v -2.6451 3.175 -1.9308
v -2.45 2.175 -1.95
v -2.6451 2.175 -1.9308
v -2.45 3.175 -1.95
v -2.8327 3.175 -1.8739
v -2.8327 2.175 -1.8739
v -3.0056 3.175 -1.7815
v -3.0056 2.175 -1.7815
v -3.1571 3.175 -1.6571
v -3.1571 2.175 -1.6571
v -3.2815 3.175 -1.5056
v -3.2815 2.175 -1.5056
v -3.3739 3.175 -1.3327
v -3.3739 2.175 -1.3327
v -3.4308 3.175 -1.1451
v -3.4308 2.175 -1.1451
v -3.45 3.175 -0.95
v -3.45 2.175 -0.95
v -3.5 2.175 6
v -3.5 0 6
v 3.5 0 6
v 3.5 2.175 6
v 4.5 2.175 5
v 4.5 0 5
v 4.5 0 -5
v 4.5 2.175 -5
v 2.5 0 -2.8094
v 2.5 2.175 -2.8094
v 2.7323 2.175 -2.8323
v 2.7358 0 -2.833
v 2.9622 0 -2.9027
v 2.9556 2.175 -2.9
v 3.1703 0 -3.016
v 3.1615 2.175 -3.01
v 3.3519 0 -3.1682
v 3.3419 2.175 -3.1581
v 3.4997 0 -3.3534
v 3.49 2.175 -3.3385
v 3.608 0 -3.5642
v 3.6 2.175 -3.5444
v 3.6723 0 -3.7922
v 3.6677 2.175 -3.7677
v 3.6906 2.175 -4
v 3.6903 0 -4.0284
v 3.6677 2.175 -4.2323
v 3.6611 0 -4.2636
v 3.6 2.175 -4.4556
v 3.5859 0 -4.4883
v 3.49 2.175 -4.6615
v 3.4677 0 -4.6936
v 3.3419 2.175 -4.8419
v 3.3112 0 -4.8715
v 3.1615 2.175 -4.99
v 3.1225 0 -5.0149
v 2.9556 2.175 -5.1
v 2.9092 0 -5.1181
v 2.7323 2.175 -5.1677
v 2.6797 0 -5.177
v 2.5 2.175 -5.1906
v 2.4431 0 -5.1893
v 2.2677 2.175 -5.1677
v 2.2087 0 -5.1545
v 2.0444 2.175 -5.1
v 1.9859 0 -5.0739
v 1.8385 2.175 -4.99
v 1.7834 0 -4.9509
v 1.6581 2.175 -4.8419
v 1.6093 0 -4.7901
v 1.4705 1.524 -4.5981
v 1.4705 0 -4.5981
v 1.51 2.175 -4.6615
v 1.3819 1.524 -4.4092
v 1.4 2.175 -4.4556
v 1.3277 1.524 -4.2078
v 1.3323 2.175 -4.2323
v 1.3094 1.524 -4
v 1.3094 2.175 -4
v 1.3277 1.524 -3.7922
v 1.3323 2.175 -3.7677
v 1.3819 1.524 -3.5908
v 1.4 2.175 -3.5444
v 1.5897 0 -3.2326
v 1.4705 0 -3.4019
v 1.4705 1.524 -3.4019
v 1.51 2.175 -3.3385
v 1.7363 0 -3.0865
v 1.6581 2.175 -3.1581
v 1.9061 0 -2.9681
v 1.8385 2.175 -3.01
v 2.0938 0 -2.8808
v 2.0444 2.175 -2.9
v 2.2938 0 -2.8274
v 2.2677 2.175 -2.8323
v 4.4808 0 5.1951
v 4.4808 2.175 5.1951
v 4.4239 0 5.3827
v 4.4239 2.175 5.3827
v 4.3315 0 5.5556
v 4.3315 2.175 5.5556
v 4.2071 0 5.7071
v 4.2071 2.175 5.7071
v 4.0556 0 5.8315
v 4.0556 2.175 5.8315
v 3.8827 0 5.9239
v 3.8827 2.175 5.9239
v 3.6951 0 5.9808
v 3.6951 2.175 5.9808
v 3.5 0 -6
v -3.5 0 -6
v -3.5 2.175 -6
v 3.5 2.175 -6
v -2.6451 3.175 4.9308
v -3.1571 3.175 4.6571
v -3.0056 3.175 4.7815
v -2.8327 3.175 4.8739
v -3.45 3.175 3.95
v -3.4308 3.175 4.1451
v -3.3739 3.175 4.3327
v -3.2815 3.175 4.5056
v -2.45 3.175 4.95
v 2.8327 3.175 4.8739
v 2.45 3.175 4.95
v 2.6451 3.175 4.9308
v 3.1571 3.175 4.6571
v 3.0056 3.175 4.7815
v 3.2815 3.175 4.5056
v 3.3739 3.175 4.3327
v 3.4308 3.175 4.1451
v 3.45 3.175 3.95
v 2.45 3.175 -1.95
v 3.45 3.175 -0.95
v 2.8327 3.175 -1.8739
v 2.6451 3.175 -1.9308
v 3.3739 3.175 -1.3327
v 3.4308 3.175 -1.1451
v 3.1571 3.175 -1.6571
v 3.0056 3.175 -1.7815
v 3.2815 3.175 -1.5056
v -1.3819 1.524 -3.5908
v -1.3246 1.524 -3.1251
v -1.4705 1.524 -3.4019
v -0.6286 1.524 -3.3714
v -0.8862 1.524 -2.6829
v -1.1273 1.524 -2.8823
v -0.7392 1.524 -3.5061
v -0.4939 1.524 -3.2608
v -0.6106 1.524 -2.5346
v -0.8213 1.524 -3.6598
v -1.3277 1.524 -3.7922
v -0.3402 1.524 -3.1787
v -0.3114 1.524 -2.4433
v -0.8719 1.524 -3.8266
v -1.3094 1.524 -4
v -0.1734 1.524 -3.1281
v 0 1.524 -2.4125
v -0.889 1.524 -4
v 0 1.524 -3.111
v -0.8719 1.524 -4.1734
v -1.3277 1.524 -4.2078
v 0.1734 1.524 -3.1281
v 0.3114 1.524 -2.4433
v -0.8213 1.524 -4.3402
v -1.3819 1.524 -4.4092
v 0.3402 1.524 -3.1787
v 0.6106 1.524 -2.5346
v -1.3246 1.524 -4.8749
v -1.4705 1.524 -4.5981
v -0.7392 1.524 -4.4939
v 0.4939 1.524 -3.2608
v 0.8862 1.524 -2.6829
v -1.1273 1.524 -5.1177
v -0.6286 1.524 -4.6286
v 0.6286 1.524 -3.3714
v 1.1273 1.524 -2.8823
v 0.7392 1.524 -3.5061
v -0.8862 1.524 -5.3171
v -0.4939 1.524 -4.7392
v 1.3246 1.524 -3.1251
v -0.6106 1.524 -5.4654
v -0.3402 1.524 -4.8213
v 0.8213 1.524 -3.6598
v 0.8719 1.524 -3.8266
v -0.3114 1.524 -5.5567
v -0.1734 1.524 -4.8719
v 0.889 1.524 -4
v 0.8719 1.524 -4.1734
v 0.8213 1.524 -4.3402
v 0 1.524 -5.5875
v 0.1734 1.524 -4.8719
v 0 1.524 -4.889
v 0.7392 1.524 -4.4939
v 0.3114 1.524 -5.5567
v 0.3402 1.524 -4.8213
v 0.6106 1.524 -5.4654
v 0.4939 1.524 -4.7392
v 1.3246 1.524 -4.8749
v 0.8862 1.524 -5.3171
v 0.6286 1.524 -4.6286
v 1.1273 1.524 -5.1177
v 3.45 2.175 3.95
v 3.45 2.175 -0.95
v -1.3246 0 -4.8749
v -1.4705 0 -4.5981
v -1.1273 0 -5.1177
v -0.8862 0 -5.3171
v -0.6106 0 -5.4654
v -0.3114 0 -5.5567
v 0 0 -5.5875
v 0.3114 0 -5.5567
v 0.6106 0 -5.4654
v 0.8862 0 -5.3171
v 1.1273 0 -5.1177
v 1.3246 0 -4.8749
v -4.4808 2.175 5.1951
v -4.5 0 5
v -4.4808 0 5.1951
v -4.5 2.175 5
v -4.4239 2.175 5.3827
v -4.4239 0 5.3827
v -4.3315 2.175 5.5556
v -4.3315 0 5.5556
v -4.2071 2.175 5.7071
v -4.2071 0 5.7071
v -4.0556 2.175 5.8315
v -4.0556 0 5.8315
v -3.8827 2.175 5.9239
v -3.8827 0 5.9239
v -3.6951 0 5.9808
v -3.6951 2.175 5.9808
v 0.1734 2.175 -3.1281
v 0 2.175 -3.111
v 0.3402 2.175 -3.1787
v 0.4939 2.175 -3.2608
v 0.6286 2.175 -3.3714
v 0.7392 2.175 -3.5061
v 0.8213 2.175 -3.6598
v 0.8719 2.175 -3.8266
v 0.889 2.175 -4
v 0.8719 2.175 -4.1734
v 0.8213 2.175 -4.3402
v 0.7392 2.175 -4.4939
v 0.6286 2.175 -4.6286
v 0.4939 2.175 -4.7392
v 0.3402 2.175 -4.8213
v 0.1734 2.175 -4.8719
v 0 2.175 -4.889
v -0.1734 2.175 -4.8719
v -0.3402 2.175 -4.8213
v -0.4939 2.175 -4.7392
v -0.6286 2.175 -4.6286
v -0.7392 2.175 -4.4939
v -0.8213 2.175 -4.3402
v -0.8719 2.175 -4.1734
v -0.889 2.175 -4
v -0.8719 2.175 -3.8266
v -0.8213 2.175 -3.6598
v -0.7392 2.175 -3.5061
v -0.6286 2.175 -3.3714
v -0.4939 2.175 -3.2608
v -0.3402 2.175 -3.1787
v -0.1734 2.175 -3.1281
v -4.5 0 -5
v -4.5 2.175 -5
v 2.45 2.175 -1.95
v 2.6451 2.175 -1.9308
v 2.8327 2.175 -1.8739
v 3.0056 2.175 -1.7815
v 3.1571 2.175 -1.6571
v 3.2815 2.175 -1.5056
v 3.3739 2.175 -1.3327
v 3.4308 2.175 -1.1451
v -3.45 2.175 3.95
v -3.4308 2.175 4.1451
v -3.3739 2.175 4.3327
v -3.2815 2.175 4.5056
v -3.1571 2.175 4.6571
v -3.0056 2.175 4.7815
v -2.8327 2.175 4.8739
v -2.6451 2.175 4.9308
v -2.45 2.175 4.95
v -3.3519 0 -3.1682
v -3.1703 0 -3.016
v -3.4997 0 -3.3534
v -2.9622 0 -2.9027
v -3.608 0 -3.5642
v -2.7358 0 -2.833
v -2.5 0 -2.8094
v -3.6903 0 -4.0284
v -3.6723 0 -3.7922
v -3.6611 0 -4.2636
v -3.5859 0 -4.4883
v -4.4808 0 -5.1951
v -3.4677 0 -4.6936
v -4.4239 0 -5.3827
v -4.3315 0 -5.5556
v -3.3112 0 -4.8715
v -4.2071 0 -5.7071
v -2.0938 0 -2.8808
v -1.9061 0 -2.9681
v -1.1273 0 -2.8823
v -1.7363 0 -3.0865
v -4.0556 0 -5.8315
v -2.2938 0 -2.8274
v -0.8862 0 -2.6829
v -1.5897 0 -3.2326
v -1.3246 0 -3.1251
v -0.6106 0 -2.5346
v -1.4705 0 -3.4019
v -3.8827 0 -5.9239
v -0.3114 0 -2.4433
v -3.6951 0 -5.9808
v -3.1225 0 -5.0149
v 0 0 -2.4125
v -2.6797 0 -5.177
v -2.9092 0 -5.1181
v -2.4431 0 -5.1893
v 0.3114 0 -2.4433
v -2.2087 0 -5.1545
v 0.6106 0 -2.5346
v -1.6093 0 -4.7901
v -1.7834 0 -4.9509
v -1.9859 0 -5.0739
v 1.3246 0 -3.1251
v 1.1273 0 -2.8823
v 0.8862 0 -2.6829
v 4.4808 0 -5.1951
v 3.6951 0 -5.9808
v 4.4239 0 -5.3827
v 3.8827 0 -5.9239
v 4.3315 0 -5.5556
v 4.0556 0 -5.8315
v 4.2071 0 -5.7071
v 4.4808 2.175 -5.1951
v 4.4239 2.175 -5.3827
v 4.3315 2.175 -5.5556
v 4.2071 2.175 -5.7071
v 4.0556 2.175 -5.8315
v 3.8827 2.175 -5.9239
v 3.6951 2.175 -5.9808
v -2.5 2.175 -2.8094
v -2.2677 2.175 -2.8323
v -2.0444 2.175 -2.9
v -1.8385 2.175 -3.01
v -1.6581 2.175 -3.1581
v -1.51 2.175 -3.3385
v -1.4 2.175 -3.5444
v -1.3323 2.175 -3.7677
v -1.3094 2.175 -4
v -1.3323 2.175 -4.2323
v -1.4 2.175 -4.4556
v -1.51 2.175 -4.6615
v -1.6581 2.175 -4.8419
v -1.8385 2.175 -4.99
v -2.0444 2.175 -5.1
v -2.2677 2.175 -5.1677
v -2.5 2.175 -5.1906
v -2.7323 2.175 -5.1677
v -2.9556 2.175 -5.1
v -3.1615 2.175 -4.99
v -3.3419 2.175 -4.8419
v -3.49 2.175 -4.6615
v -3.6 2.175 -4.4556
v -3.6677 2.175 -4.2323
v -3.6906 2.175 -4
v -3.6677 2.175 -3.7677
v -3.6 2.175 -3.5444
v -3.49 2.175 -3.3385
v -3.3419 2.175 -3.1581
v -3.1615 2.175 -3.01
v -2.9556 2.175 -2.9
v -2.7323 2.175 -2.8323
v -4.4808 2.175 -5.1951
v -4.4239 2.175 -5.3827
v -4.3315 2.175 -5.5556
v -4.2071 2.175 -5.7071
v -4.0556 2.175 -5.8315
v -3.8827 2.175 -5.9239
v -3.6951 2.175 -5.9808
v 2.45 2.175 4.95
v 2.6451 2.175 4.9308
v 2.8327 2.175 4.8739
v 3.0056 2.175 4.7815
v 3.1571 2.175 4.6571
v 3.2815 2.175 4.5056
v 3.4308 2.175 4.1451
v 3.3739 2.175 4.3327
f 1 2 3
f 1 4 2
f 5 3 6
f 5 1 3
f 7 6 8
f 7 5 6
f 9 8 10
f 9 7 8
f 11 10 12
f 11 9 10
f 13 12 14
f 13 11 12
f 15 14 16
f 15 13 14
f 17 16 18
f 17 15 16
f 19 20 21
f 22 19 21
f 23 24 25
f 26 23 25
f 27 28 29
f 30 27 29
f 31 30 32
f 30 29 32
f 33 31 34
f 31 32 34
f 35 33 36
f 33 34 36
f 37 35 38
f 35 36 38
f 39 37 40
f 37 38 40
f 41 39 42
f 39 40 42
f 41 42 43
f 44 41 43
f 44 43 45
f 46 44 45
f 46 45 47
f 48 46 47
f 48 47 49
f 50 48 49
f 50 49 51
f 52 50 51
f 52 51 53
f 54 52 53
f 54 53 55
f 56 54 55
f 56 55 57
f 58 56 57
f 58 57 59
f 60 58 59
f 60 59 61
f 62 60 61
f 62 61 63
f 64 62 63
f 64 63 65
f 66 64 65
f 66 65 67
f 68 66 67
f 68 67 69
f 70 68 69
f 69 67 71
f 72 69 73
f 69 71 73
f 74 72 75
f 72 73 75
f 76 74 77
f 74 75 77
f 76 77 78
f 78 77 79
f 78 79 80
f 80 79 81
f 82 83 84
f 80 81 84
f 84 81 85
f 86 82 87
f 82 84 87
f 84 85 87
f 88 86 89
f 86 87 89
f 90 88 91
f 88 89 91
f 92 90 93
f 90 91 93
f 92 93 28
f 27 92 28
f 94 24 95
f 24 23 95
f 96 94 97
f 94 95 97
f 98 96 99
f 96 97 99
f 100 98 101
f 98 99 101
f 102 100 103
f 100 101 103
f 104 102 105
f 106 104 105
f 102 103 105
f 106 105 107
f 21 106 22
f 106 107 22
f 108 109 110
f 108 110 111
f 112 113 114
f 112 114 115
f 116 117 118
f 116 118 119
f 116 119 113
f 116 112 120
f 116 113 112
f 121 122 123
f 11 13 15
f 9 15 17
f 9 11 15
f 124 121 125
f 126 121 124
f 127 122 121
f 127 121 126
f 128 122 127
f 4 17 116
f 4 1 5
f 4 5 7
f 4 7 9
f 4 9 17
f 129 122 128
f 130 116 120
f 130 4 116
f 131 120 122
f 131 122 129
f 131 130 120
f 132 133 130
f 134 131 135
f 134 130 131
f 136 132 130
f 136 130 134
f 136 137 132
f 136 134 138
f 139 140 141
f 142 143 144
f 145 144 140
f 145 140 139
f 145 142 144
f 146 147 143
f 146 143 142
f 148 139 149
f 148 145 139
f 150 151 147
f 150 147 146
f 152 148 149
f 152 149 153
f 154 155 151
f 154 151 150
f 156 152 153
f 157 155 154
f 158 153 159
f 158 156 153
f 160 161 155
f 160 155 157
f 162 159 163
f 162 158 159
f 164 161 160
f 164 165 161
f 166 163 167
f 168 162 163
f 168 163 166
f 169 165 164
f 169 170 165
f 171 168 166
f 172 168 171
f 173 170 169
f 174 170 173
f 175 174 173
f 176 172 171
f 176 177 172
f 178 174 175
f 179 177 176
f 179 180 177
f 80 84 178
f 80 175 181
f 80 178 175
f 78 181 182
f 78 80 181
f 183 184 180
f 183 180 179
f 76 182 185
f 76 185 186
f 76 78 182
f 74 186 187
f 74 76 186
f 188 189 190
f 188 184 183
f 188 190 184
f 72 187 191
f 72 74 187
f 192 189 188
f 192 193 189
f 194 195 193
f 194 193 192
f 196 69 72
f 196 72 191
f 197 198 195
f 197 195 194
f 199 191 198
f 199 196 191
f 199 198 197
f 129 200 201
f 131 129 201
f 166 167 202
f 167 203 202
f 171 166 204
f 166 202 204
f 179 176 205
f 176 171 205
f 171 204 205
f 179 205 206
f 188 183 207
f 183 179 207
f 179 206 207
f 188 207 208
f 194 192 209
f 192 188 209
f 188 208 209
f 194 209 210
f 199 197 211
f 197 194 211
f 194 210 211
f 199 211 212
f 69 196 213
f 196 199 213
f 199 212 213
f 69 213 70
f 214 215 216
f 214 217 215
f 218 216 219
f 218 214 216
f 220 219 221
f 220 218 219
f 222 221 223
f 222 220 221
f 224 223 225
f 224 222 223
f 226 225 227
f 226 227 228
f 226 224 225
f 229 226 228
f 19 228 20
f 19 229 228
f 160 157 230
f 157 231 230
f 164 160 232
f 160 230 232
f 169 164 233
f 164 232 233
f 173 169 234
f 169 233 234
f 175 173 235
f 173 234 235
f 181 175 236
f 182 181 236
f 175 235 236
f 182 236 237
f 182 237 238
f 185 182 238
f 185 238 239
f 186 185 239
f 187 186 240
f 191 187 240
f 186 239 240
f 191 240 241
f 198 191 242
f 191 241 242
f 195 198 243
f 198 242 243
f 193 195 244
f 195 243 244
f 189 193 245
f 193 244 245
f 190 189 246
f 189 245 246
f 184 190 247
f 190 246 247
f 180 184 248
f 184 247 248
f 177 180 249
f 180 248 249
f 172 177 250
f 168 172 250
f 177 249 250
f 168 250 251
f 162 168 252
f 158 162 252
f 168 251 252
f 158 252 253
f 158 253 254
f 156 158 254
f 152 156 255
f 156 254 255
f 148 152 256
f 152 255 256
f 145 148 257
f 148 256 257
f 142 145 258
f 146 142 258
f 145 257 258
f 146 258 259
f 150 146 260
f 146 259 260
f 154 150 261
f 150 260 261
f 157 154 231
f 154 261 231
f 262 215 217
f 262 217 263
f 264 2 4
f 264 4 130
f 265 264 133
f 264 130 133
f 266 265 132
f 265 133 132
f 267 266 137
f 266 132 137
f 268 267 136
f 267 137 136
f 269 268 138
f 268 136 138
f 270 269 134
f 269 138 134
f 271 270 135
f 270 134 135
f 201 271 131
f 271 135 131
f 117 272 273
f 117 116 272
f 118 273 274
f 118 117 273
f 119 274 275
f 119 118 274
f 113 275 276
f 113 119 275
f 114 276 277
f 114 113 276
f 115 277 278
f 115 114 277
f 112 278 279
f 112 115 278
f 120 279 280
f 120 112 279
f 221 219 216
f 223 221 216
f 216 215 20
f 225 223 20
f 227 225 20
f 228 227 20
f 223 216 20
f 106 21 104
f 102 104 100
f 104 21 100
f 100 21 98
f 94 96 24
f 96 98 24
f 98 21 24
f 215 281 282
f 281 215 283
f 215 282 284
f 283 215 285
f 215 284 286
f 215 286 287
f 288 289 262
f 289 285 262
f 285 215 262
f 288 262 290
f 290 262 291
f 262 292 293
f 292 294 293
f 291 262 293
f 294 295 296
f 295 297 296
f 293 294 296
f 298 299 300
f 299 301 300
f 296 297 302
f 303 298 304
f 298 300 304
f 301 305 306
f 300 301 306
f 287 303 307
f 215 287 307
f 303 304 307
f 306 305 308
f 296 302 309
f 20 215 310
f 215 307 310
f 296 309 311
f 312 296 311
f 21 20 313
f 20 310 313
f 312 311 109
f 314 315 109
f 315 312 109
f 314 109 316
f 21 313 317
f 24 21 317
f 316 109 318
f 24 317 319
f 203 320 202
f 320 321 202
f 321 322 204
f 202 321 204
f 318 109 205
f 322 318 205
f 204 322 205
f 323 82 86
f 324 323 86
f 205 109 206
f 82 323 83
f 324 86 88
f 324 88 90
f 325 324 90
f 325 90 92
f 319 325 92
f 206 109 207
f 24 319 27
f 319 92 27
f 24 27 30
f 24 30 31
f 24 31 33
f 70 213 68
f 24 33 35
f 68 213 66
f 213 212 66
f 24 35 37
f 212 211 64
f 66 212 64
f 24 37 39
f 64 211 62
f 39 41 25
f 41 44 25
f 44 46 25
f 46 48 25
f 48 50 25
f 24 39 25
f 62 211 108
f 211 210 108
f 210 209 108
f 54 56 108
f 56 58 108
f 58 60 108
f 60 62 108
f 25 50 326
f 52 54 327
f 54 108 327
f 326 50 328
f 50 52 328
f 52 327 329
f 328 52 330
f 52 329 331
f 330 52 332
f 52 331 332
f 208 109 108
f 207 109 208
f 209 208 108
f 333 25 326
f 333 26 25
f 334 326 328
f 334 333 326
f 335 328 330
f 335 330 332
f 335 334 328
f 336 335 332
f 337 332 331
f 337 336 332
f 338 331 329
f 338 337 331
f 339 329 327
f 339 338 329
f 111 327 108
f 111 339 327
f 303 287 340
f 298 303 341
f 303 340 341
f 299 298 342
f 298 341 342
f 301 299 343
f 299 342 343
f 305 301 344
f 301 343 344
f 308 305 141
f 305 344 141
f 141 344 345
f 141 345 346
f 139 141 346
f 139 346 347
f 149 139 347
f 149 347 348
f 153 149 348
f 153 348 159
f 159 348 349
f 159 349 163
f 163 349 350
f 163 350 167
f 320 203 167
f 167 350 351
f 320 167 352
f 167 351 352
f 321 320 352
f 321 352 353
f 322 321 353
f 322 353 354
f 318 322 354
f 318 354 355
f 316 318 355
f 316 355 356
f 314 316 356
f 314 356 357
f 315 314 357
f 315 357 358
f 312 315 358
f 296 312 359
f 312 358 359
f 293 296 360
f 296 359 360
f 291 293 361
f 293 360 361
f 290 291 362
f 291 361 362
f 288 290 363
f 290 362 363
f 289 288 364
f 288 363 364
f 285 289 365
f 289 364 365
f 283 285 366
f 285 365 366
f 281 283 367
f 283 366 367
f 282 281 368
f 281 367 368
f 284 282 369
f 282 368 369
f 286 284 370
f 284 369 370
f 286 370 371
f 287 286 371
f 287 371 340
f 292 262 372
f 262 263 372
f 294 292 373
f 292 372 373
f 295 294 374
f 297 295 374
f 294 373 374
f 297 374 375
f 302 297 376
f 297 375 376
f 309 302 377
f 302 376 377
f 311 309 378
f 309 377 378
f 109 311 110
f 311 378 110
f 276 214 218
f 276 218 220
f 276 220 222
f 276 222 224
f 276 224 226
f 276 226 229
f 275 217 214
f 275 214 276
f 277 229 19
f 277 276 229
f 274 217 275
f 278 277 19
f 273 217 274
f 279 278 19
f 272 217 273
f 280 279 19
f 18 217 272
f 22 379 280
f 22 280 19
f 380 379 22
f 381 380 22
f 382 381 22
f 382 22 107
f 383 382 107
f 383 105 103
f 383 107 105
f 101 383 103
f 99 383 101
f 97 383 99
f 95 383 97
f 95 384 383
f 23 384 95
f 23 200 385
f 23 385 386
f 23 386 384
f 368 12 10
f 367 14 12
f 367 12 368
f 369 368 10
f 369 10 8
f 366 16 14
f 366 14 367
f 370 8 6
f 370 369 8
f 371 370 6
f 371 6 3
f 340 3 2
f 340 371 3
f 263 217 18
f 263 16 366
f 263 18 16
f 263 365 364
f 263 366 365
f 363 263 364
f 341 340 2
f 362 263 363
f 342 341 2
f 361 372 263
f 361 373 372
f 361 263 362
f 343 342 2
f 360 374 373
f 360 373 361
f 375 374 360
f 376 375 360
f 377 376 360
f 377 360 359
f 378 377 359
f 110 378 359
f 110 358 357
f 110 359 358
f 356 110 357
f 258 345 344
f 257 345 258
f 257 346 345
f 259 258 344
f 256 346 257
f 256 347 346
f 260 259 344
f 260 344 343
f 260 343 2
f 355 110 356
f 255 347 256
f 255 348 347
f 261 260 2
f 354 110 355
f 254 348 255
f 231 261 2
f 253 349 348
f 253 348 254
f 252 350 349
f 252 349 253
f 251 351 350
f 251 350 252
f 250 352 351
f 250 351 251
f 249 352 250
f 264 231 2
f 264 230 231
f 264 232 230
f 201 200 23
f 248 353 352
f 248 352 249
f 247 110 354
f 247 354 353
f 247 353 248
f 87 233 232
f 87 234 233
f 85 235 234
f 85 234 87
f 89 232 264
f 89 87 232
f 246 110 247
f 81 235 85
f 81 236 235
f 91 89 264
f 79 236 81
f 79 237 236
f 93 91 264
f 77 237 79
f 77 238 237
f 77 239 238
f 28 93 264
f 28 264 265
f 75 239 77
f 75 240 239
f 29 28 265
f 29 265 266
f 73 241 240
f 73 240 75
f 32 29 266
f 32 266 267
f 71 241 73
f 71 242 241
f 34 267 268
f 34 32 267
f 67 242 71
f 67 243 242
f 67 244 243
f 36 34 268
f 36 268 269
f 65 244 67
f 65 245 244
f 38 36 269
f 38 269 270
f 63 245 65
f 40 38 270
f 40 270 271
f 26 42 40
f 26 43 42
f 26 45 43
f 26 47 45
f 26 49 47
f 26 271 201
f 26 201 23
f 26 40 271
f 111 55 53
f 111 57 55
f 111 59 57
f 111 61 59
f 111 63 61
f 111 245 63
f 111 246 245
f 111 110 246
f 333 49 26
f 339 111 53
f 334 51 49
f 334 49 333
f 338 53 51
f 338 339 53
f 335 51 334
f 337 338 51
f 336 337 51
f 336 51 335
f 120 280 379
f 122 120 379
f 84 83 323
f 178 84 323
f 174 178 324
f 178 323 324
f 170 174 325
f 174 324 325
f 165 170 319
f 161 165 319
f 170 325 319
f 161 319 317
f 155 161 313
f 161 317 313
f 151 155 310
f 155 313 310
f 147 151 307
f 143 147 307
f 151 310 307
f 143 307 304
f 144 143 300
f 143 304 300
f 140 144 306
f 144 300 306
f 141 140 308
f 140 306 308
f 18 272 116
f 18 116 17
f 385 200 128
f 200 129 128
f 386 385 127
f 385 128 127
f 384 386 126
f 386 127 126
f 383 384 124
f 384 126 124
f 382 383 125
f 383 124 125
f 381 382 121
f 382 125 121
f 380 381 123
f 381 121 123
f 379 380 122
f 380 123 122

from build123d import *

# Parameters (mm, degrees)
SKETCH1_W                                      = 9
SKETCH1_H                                      = 12
EXTRUDE1_DEPTH                                 = 2.175
SKETCH3_W                                      = 6.9
SKETCH3_H                                      = 6.9
EXTRUDE3_DEPTH                                 = 1
CBORE_FOR_0_SOCKET_HEAD_CAP_SCREW1_D           = 1.778
CBORE_FOR_0_SOCKET_HEAD_CAP_SCREW1_CBORE_D     = 3.175
CBORE_FOR_0_SOCKET_HEAD_CAP_SCREW1_CBORE_DEPTH = 1.524
F_3_32_0_09375_DIAMETER_HOLE1_D                = 2.38125
F_3_32_0_09375_DIAMETER_HOLE1_DEPTH            = 10
F_3_32_0_09375_DIAMETER_HOLE1_TIP              = 0.715399675
FILLET1_R                                      = 1


with BuildPart() as part:
    # Sketch1 → Extrude1 (new body)
    with BuildSketch(Plane(origin=(0, 0, 0), x_dir=(1, 0, 0), z_dir=(0, 1, 0))):
        Rectangle(SKETCH1_W, SKETCH1_H)
    extrude(amount=EXTRUDE1_DEPTH)

    # Sketch3 → Extrude3 (add)
    with BuildSketch(Plane(origin=(0, 2.175, 0), x_dir=(1, 0, 0), z_dir=(0, 1, 0))):
        with Locations((0, -1.5)):
            Rectangle(SKETCH3_W, SKETCH3_H)
    extrude(amount=EXTRUDE3_DEPTH)

    # CBORE for #0 Socket Head Cap Screw1 (through all)
    with Locations(Plane(origin=(0, 0, -4), x_dir=(0, 0, -1), z_dir=(0, -1, 0))):
        with Locations((0, 0)):
            CounterBoreHole(CBORE_FOR_0_SOCKET_HEAD_CAP_SCREW1_D / 2, CBORE_FOR_0_SOCKET_HEAD_CAP_SCREW1_CBORE_D / 2, CBORE_FOR_0_SOCKET_HEAD_CAP_SCREW1_CBORE_DEPTH)

    # 3/32 (0.09375) Diameter Hole1
    with Locations(Plane(origin=(-2.5, 0, -4), x_dir=(0, 0, -1), z_dir=(0, -1, 0))):
        with Locations((0, 0), (0, 5)):
            Hole(F_3_32_0_09375_DIAMETER_HOLE1_D / 2, depth=F_3_32_0_09375_DIAMETER_HOLE1_DEPTH)
            with Locations((0, 0, -(F_3_32_0_09375_DIAMETER_HOLE1_DEPTH + F_3_32_0_09375_DIAMETER_HOLE1_TIP / 2))):  # 118° drill point
                Cone(0, F_3_32_0_09375_DIAMETER_HOLE1_D / 2, F_3_32_0_09375_DIAMETER_HOLE1_TIP, mode=Mode.SUBTRACT)

    # Fillet1
    fillet1_edges = [part.edges().sort_by_distance(p)[0] for p in [
        (-3.45, 2.675, -1.95),
        (-3.45, 2.675, 4.95),
        (3.45, 2.675, 4.95),
        (3.45, 2.675, -1.95),
        (-4.5, 1.0875, -6),
        (4.5, 1.0875, -6),
        (4.5, 1.0875, 6),
        (-4.5, 1.0875, 6),
    ]]
    fillet(fillet1_edges, radius=FILLET1_R)


solid = part.part
